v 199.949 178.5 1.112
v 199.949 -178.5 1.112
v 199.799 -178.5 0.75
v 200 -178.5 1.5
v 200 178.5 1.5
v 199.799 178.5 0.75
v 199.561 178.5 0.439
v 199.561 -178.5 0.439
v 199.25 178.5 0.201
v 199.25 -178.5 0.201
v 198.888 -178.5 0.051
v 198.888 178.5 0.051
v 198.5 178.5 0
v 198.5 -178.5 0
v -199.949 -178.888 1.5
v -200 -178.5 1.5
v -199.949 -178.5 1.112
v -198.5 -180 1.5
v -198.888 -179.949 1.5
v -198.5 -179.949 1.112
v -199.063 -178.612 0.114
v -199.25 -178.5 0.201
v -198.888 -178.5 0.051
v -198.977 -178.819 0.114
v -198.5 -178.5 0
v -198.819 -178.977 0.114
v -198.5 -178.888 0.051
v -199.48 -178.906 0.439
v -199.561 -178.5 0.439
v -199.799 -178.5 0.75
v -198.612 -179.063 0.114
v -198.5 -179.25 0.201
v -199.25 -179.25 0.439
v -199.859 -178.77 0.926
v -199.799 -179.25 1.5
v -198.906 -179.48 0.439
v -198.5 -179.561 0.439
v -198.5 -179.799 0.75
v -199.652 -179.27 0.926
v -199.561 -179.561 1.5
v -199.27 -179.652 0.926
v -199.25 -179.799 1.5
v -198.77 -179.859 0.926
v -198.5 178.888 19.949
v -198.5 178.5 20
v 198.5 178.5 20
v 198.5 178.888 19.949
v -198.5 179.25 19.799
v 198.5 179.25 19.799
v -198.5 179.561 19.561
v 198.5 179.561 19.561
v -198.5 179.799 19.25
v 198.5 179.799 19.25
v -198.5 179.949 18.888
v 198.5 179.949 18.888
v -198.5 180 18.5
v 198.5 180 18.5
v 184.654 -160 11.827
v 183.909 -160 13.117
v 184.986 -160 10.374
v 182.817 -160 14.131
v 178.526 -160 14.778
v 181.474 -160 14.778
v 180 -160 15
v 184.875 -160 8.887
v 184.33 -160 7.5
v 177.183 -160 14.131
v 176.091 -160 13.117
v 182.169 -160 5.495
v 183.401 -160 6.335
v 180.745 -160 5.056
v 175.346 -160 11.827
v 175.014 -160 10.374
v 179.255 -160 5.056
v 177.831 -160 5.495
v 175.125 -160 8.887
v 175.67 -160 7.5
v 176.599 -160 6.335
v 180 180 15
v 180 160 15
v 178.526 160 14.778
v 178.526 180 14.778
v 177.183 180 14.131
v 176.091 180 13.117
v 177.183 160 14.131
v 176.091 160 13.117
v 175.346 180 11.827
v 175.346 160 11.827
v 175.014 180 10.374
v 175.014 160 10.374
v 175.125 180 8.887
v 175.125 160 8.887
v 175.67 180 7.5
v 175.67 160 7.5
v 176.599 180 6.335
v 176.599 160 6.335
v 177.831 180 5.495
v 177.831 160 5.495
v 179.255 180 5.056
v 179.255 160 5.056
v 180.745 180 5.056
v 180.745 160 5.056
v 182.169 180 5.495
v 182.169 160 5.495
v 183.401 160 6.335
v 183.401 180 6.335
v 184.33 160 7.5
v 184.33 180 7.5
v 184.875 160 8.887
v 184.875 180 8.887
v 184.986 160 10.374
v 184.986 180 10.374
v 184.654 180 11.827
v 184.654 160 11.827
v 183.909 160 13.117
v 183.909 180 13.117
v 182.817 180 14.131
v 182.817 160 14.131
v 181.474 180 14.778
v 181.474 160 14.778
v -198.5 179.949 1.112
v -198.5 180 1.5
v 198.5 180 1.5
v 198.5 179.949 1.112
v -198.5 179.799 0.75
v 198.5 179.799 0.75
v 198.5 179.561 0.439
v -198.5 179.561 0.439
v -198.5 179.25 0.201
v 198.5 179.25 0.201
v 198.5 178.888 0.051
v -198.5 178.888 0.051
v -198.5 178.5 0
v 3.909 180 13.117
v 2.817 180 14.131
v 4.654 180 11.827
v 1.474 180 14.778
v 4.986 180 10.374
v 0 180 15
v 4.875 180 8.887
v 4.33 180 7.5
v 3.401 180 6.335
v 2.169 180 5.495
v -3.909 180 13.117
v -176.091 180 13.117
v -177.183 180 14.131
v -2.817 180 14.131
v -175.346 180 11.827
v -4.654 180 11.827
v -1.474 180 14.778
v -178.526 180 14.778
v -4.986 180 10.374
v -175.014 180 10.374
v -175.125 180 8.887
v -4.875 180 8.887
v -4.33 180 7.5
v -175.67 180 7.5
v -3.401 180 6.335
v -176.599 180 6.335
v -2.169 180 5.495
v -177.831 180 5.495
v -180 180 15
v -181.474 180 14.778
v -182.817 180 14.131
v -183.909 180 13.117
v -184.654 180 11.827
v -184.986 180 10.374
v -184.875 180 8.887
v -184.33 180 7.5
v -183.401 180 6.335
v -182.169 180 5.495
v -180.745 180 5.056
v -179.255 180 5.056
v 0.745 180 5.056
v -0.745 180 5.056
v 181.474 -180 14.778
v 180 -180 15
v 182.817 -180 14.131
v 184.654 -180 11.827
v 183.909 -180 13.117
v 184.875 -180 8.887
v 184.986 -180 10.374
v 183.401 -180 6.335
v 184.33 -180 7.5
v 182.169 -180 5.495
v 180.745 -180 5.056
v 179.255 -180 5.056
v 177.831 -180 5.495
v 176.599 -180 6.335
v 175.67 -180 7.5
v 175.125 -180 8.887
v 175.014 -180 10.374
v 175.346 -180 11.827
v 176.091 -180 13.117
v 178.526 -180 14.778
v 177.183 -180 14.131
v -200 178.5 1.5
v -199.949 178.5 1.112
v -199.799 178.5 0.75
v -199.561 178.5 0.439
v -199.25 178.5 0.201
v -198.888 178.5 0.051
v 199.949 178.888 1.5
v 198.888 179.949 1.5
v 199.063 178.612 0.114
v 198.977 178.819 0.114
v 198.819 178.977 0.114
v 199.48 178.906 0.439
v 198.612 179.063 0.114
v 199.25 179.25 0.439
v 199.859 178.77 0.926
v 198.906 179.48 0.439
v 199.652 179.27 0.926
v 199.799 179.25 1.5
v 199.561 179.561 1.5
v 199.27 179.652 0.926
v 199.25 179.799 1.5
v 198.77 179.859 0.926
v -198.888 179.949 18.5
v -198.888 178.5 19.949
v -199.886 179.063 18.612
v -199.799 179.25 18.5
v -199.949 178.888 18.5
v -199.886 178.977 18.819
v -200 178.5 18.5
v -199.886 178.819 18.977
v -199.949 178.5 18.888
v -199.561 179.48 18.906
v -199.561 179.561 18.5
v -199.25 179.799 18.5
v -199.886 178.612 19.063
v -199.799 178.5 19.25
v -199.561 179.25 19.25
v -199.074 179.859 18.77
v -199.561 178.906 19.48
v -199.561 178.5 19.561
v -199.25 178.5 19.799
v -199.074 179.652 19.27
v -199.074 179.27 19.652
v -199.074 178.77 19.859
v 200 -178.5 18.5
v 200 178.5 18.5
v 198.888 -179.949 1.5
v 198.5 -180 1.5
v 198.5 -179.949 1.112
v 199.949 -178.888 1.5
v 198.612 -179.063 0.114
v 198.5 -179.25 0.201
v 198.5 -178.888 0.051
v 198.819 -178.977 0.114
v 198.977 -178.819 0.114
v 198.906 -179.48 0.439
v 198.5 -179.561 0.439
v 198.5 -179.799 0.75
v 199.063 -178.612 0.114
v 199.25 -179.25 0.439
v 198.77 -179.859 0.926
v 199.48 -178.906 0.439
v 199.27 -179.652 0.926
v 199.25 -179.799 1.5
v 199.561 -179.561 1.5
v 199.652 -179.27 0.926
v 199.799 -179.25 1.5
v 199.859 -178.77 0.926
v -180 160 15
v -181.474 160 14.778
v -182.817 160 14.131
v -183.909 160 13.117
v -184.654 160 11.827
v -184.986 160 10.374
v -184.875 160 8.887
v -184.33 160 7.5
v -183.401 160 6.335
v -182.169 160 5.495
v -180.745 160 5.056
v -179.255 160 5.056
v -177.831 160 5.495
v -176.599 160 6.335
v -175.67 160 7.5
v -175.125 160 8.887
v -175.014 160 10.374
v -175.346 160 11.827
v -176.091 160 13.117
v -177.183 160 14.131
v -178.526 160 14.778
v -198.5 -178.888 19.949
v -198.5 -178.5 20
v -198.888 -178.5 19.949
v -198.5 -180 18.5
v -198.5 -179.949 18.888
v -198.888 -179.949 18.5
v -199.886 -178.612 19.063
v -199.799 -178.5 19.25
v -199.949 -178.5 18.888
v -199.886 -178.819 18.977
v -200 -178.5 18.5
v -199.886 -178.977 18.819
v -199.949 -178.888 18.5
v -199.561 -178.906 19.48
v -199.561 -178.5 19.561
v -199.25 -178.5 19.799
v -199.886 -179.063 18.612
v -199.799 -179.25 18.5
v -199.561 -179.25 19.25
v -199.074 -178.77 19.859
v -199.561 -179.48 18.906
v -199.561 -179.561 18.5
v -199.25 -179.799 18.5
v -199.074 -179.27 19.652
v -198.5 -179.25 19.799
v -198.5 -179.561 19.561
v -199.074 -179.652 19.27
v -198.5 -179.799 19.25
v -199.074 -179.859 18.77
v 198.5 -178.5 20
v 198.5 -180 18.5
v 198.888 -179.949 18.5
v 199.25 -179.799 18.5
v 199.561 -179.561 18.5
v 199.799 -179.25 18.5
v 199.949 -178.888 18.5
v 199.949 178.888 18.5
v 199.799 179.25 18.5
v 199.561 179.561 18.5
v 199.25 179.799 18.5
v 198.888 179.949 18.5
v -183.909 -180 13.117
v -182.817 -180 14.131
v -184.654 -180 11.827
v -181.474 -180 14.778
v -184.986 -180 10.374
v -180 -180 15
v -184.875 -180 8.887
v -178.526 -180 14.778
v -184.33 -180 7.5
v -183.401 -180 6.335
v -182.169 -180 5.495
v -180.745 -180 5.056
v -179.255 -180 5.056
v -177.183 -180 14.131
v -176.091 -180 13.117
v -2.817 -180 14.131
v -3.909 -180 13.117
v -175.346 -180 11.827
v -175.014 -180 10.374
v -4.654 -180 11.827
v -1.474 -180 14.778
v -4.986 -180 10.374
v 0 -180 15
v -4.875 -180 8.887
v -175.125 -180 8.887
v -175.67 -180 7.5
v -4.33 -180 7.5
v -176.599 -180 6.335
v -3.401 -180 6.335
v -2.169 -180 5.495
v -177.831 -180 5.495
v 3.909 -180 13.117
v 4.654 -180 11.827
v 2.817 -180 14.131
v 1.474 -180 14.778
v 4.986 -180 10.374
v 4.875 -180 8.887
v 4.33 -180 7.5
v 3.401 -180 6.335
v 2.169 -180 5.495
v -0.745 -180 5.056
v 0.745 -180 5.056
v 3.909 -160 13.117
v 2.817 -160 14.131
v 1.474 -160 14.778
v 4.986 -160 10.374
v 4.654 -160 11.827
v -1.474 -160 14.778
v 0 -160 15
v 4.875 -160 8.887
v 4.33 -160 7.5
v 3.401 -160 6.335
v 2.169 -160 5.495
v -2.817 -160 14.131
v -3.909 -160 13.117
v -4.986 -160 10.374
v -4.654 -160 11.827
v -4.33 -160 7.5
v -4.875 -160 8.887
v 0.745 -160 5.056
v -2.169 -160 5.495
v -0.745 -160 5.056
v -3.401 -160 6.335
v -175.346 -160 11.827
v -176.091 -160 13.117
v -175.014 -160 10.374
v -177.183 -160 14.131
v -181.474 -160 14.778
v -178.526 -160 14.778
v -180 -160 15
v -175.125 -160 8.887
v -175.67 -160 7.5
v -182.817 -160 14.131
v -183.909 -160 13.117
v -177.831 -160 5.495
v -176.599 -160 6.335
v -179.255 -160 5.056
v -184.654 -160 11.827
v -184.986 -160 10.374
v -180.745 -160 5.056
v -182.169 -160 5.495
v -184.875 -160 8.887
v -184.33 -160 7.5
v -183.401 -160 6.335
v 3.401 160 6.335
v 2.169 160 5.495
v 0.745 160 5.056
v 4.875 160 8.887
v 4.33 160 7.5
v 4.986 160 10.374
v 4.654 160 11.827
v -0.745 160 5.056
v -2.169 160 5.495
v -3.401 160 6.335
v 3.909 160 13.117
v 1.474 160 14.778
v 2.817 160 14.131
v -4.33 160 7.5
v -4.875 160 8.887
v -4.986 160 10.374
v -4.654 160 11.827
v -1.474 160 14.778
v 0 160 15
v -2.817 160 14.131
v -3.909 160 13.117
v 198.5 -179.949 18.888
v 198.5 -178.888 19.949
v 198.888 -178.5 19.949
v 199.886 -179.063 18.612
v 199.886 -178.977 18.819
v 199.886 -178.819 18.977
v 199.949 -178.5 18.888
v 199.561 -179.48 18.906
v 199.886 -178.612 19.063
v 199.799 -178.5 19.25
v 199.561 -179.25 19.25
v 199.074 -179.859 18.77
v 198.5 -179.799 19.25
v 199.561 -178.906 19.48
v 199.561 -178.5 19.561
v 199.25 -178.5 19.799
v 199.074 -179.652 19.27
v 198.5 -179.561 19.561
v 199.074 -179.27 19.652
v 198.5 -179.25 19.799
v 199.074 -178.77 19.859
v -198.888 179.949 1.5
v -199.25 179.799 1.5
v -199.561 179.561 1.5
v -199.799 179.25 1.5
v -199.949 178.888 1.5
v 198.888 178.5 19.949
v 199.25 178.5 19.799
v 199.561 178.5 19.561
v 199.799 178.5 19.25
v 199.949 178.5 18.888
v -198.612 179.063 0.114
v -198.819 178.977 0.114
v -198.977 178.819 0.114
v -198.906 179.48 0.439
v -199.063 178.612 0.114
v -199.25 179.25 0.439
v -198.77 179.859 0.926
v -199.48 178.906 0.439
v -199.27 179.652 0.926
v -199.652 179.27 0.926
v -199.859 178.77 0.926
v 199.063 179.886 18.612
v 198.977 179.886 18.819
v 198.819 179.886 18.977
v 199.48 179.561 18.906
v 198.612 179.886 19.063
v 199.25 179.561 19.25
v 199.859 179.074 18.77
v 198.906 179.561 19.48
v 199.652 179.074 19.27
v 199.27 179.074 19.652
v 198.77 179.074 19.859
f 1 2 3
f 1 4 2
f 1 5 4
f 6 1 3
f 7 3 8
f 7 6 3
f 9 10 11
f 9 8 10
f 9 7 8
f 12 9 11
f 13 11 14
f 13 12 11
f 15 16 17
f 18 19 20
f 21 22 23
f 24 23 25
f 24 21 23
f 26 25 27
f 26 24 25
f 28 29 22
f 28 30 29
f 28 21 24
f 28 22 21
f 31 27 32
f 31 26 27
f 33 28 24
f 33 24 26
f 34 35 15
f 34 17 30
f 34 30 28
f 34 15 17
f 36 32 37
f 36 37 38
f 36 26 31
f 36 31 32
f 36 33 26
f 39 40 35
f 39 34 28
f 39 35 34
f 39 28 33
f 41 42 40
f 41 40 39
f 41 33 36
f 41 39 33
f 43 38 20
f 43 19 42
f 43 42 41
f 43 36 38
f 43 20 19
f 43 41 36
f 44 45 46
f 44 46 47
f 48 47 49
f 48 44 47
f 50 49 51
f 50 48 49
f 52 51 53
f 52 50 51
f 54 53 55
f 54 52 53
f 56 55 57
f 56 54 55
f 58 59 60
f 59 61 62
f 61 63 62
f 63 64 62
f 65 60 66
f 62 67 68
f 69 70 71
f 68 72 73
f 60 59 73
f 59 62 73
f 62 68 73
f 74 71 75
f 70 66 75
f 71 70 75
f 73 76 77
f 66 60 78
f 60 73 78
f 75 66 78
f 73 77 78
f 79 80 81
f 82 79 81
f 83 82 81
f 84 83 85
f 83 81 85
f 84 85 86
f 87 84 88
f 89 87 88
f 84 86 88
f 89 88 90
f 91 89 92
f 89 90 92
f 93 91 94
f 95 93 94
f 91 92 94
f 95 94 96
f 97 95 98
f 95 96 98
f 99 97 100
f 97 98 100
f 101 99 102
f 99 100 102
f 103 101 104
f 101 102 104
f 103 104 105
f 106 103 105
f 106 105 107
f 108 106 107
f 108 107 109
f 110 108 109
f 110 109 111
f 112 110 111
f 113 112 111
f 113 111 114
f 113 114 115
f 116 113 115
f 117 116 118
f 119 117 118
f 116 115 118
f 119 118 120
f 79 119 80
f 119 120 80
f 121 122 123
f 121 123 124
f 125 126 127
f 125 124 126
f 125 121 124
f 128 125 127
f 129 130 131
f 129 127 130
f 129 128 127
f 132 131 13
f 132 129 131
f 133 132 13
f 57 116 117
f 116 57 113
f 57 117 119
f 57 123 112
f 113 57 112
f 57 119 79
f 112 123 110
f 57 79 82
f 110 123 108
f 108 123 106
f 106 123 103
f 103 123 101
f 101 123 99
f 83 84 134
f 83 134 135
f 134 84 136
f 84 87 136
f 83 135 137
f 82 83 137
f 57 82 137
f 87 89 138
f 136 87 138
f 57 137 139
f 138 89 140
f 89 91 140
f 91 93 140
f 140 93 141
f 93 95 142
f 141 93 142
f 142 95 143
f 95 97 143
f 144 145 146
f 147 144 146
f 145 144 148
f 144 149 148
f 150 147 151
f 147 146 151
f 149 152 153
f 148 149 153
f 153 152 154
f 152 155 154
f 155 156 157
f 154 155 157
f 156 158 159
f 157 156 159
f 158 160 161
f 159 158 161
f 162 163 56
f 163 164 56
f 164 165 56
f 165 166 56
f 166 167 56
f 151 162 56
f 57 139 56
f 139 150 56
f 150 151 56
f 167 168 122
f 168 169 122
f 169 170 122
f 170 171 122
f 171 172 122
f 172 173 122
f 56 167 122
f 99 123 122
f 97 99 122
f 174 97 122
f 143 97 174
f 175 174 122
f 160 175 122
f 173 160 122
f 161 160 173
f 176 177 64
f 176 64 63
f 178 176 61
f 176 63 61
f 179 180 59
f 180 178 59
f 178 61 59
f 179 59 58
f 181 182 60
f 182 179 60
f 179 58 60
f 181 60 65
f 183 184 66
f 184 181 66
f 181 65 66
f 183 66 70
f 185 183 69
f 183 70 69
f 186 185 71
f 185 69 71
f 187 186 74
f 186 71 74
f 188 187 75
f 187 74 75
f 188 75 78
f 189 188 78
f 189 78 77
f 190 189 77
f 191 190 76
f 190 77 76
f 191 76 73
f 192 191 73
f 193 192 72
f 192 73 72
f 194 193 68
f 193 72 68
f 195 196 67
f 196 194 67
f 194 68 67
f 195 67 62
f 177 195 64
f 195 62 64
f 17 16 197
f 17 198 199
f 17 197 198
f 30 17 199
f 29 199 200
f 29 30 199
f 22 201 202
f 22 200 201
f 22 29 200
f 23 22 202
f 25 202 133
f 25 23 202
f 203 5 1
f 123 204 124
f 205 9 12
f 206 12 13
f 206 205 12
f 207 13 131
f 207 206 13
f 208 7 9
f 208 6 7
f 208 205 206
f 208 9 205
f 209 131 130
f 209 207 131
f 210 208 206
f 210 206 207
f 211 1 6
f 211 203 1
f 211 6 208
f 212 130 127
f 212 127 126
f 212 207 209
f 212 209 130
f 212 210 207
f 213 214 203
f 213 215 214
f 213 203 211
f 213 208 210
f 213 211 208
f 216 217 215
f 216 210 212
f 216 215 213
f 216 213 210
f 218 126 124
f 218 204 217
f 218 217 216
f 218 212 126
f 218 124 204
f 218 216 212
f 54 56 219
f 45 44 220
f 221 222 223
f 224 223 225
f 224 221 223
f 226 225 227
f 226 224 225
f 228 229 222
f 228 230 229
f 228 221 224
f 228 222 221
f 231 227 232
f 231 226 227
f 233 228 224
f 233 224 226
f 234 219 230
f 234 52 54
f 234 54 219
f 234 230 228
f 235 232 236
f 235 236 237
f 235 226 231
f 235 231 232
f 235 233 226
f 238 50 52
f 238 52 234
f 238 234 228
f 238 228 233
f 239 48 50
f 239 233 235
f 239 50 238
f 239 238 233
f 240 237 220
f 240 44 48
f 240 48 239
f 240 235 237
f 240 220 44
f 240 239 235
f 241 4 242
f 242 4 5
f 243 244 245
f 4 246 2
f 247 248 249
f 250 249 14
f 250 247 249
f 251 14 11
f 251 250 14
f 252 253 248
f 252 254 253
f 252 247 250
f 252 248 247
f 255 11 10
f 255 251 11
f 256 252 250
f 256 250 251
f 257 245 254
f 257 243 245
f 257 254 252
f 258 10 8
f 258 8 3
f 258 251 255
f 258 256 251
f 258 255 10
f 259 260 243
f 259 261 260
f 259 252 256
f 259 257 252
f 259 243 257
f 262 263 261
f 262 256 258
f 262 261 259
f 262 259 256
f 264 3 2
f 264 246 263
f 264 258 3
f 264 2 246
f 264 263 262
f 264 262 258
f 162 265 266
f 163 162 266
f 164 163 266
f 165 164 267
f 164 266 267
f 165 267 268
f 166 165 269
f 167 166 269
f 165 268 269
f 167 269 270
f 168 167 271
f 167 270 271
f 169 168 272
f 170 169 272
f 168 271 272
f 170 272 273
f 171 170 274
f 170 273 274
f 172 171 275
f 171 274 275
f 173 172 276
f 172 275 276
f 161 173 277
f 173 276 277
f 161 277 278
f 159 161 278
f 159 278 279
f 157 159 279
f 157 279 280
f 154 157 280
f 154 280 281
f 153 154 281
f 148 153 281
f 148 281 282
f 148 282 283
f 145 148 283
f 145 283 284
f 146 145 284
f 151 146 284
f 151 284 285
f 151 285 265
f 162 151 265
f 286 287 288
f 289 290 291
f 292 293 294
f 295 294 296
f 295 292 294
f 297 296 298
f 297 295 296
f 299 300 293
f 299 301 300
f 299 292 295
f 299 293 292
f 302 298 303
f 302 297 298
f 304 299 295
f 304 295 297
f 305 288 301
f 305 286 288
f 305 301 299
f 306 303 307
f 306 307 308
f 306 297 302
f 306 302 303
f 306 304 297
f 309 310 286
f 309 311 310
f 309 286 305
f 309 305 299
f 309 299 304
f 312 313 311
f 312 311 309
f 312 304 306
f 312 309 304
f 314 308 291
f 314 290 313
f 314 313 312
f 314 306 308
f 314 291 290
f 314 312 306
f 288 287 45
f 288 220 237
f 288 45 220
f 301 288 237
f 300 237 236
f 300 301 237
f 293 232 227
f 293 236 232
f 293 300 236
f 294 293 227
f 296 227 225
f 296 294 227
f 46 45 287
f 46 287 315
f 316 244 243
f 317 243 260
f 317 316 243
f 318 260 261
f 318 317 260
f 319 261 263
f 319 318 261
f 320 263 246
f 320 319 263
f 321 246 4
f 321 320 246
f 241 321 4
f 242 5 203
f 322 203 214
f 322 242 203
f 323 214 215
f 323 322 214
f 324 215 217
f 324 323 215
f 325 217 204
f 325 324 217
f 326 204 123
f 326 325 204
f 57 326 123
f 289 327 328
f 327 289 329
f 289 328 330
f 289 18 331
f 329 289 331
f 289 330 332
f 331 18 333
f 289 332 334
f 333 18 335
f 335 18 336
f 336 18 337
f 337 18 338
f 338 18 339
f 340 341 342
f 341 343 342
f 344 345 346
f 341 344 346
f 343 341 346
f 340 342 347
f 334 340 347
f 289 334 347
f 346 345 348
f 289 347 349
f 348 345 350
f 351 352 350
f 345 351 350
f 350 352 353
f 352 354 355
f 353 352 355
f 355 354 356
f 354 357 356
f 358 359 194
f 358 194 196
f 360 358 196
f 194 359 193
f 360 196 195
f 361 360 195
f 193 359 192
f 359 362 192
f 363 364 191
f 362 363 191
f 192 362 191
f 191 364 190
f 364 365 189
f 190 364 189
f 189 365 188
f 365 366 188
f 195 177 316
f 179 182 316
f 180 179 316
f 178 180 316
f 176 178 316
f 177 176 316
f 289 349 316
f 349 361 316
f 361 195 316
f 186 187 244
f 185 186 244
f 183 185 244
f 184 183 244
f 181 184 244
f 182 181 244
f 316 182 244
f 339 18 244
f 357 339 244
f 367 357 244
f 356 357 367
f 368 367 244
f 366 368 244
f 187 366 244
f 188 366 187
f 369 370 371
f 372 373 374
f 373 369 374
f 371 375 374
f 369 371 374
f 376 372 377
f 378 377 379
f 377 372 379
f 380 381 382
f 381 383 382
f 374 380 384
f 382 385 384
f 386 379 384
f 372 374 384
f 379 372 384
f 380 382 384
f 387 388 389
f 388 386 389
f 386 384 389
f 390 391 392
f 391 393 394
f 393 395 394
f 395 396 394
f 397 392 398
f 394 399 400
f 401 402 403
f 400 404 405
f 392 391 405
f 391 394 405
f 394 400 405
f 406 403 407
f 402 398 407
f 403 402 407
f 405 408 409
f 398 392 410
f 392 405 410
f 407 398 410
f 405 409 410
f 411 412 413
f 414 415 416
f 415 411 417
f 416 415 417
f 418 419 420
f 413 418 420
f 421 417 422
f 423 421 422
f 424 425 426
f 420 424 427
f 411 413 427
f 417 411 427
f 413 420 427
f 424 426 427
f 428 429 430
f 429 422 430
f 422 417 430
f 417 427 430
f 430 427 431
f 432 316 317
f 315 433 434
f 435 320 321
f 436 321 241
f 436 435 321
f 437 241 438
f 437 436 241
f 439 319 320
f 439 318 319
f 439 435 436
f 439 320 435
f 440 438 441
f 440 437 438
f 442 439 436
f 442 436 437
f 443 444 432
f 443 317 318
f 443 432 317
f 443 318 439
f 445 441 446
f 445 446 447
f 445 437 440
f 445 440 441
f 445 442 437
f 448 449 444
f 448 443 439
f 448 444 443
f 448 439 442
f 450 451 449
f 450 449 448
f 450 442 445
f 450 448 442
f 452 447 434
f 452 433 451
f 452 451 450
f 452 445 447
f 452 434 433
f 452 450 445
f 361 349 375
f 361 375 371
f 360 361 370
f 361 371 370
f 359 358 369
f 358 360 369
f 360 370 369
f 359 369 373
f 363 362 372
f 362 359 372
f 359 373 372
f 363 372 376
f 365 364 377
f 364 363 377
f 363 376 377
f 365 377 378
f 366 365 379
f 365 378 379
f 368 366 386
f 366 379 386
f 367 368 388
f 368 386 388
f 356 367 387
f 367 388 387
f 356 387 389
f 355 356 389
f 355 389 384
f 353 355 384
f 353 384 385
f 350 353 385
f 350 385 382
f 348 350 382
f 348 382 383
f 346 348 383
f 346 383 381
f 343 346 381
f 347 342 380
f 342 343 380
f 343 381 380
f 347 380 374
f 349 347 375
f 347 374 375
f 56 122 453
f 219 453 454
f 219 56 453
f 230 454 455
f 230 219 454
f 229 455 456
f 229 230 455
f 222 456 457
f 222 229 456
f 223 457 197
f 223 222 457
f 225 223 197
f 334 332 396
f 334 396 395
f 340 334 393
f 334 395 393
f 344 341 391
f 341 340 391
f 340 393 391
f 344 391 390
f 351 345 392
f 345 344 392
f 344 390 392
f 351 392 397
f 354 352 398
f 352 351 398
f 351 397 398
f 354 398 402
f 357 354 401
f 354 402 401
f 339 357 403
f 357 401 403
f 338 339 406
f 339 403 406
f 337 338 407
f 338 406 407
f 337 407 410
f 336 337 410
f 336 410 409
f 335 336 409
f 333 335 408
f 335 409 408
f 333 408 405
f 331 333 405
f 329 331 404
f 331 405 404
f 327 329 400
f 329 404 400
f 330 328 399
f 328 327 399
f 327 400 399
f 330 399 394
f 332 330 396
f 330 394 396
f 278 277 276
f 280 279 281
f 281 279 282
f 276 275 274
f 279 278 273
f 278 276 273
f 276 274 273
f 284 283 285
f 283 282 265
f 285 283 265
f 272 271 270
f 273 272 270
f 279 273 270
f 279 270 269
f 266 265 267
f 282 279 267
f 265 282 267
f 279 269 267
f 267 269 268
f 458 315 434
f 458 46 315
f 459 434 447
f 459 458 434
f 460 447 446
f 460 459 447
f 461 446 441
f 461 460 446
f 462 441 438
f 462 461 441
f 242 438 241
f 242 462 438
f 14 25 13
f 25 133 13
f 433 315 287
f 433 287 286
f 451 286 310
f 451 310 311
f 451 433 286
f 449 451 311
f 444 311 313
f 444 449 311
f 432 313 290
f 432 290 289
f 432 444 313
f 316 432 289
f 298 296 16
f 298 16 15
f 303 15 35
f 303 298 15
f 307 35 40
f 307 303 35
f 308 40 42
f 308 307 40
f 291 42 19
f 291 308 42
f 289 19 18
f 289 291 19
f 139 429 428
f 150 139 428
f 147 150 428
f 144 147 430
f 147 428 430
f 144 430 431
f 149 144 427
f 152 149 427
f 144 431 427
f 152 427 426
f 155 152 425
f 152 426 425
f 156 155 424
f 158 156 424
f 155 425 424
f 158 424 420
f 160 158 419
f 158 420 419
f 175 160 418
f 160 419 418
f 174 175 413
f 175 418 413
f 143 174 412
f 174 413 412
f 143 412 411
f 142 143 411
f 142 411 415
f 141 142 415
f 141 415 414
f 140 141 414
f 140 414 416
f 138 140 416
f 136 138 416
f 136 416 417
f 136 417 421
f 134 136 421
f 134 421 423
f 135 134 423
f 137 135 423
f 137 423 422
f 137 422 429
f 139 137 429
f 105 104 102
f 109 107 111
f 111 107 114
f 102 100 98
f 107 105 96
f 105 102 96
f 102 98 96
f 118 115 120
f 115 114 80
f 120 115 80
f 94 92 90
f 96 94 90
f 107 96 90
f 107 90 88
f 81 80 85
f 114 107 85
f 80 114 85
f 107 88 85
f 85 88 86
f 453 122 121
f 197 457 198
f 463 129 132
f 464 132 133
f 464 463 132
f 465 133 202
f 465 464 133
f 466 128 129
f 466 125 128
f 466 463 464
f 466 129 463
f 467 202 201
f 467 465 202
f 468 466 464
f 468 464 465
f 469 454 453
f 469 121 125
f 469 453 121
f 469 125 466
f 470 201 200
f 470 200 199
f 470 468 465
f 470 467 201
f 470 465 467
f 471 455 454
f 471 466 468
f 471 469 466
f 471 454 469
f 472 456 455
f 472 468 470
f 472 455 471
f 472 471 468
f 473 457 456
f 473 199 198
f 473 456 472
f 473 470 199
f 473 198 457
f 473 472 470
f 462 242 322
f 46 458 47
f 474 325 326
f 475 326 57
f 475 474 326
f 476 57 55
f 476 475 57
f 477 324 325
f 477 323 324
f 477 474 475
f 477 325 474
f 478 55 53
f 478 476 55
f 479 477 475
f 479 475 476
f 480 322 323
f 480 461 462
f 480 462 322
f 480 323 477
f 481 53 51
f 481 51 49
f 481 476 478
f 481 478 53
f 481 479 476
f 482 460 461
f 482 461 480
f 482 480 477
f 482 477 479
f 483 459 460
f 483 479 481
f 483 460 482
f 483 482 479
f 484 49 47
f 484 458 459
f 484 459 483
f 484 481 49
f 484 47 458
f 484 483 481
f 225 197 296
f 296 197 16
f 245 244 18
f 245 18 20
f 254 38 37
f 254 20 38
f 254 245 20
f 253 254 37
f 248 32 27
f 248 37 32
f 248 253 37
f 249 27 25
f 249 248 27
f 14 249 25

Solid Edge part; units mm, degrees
sketch "Sketch1" plane through (0, 0, 0) normal (0, 0, 1) x (1, 0, 0)
  line L0 (-200, -180) -> (200, -180)
  line L1 (200, -180) -> (200, 180)
  line L2 (200, 180) -> (-200, 180)
  line L3 (-200, 180) -> (-200, -180)
extrude "Protrusion1" add sketch "Sketch1" along normal blind 20
hole "Hole_1" at (-180, 180, 10) direction (0, -1, 0) diameter 10 depth 20
hole "Hole1" at (0, 180, 10) direction (0, -1, 0) diameter 10 depth 20
hole "Hole2" at (180, 180, 10) direction (0, -1, 0) diameter 10 depth 20
mirror "Mirror1" about plane through (0, 0, 0) normal (0, -1, 0) of "Hole_1", "Hole1", "Hole2"
fillet "Round_1" radius 1.5 12 edges at (0, -180, 20) (200, 0, 20) (0, 180, 20) (-200, 0, 20) (200, 180, 10) (200, -180, 10) (-200, 180, 10) (-200, -180, 10) (0, -180, 0) (-200, 0, 0) (200, 0, 0) (0, 180, 0)
properties material "Wood, Oak"
